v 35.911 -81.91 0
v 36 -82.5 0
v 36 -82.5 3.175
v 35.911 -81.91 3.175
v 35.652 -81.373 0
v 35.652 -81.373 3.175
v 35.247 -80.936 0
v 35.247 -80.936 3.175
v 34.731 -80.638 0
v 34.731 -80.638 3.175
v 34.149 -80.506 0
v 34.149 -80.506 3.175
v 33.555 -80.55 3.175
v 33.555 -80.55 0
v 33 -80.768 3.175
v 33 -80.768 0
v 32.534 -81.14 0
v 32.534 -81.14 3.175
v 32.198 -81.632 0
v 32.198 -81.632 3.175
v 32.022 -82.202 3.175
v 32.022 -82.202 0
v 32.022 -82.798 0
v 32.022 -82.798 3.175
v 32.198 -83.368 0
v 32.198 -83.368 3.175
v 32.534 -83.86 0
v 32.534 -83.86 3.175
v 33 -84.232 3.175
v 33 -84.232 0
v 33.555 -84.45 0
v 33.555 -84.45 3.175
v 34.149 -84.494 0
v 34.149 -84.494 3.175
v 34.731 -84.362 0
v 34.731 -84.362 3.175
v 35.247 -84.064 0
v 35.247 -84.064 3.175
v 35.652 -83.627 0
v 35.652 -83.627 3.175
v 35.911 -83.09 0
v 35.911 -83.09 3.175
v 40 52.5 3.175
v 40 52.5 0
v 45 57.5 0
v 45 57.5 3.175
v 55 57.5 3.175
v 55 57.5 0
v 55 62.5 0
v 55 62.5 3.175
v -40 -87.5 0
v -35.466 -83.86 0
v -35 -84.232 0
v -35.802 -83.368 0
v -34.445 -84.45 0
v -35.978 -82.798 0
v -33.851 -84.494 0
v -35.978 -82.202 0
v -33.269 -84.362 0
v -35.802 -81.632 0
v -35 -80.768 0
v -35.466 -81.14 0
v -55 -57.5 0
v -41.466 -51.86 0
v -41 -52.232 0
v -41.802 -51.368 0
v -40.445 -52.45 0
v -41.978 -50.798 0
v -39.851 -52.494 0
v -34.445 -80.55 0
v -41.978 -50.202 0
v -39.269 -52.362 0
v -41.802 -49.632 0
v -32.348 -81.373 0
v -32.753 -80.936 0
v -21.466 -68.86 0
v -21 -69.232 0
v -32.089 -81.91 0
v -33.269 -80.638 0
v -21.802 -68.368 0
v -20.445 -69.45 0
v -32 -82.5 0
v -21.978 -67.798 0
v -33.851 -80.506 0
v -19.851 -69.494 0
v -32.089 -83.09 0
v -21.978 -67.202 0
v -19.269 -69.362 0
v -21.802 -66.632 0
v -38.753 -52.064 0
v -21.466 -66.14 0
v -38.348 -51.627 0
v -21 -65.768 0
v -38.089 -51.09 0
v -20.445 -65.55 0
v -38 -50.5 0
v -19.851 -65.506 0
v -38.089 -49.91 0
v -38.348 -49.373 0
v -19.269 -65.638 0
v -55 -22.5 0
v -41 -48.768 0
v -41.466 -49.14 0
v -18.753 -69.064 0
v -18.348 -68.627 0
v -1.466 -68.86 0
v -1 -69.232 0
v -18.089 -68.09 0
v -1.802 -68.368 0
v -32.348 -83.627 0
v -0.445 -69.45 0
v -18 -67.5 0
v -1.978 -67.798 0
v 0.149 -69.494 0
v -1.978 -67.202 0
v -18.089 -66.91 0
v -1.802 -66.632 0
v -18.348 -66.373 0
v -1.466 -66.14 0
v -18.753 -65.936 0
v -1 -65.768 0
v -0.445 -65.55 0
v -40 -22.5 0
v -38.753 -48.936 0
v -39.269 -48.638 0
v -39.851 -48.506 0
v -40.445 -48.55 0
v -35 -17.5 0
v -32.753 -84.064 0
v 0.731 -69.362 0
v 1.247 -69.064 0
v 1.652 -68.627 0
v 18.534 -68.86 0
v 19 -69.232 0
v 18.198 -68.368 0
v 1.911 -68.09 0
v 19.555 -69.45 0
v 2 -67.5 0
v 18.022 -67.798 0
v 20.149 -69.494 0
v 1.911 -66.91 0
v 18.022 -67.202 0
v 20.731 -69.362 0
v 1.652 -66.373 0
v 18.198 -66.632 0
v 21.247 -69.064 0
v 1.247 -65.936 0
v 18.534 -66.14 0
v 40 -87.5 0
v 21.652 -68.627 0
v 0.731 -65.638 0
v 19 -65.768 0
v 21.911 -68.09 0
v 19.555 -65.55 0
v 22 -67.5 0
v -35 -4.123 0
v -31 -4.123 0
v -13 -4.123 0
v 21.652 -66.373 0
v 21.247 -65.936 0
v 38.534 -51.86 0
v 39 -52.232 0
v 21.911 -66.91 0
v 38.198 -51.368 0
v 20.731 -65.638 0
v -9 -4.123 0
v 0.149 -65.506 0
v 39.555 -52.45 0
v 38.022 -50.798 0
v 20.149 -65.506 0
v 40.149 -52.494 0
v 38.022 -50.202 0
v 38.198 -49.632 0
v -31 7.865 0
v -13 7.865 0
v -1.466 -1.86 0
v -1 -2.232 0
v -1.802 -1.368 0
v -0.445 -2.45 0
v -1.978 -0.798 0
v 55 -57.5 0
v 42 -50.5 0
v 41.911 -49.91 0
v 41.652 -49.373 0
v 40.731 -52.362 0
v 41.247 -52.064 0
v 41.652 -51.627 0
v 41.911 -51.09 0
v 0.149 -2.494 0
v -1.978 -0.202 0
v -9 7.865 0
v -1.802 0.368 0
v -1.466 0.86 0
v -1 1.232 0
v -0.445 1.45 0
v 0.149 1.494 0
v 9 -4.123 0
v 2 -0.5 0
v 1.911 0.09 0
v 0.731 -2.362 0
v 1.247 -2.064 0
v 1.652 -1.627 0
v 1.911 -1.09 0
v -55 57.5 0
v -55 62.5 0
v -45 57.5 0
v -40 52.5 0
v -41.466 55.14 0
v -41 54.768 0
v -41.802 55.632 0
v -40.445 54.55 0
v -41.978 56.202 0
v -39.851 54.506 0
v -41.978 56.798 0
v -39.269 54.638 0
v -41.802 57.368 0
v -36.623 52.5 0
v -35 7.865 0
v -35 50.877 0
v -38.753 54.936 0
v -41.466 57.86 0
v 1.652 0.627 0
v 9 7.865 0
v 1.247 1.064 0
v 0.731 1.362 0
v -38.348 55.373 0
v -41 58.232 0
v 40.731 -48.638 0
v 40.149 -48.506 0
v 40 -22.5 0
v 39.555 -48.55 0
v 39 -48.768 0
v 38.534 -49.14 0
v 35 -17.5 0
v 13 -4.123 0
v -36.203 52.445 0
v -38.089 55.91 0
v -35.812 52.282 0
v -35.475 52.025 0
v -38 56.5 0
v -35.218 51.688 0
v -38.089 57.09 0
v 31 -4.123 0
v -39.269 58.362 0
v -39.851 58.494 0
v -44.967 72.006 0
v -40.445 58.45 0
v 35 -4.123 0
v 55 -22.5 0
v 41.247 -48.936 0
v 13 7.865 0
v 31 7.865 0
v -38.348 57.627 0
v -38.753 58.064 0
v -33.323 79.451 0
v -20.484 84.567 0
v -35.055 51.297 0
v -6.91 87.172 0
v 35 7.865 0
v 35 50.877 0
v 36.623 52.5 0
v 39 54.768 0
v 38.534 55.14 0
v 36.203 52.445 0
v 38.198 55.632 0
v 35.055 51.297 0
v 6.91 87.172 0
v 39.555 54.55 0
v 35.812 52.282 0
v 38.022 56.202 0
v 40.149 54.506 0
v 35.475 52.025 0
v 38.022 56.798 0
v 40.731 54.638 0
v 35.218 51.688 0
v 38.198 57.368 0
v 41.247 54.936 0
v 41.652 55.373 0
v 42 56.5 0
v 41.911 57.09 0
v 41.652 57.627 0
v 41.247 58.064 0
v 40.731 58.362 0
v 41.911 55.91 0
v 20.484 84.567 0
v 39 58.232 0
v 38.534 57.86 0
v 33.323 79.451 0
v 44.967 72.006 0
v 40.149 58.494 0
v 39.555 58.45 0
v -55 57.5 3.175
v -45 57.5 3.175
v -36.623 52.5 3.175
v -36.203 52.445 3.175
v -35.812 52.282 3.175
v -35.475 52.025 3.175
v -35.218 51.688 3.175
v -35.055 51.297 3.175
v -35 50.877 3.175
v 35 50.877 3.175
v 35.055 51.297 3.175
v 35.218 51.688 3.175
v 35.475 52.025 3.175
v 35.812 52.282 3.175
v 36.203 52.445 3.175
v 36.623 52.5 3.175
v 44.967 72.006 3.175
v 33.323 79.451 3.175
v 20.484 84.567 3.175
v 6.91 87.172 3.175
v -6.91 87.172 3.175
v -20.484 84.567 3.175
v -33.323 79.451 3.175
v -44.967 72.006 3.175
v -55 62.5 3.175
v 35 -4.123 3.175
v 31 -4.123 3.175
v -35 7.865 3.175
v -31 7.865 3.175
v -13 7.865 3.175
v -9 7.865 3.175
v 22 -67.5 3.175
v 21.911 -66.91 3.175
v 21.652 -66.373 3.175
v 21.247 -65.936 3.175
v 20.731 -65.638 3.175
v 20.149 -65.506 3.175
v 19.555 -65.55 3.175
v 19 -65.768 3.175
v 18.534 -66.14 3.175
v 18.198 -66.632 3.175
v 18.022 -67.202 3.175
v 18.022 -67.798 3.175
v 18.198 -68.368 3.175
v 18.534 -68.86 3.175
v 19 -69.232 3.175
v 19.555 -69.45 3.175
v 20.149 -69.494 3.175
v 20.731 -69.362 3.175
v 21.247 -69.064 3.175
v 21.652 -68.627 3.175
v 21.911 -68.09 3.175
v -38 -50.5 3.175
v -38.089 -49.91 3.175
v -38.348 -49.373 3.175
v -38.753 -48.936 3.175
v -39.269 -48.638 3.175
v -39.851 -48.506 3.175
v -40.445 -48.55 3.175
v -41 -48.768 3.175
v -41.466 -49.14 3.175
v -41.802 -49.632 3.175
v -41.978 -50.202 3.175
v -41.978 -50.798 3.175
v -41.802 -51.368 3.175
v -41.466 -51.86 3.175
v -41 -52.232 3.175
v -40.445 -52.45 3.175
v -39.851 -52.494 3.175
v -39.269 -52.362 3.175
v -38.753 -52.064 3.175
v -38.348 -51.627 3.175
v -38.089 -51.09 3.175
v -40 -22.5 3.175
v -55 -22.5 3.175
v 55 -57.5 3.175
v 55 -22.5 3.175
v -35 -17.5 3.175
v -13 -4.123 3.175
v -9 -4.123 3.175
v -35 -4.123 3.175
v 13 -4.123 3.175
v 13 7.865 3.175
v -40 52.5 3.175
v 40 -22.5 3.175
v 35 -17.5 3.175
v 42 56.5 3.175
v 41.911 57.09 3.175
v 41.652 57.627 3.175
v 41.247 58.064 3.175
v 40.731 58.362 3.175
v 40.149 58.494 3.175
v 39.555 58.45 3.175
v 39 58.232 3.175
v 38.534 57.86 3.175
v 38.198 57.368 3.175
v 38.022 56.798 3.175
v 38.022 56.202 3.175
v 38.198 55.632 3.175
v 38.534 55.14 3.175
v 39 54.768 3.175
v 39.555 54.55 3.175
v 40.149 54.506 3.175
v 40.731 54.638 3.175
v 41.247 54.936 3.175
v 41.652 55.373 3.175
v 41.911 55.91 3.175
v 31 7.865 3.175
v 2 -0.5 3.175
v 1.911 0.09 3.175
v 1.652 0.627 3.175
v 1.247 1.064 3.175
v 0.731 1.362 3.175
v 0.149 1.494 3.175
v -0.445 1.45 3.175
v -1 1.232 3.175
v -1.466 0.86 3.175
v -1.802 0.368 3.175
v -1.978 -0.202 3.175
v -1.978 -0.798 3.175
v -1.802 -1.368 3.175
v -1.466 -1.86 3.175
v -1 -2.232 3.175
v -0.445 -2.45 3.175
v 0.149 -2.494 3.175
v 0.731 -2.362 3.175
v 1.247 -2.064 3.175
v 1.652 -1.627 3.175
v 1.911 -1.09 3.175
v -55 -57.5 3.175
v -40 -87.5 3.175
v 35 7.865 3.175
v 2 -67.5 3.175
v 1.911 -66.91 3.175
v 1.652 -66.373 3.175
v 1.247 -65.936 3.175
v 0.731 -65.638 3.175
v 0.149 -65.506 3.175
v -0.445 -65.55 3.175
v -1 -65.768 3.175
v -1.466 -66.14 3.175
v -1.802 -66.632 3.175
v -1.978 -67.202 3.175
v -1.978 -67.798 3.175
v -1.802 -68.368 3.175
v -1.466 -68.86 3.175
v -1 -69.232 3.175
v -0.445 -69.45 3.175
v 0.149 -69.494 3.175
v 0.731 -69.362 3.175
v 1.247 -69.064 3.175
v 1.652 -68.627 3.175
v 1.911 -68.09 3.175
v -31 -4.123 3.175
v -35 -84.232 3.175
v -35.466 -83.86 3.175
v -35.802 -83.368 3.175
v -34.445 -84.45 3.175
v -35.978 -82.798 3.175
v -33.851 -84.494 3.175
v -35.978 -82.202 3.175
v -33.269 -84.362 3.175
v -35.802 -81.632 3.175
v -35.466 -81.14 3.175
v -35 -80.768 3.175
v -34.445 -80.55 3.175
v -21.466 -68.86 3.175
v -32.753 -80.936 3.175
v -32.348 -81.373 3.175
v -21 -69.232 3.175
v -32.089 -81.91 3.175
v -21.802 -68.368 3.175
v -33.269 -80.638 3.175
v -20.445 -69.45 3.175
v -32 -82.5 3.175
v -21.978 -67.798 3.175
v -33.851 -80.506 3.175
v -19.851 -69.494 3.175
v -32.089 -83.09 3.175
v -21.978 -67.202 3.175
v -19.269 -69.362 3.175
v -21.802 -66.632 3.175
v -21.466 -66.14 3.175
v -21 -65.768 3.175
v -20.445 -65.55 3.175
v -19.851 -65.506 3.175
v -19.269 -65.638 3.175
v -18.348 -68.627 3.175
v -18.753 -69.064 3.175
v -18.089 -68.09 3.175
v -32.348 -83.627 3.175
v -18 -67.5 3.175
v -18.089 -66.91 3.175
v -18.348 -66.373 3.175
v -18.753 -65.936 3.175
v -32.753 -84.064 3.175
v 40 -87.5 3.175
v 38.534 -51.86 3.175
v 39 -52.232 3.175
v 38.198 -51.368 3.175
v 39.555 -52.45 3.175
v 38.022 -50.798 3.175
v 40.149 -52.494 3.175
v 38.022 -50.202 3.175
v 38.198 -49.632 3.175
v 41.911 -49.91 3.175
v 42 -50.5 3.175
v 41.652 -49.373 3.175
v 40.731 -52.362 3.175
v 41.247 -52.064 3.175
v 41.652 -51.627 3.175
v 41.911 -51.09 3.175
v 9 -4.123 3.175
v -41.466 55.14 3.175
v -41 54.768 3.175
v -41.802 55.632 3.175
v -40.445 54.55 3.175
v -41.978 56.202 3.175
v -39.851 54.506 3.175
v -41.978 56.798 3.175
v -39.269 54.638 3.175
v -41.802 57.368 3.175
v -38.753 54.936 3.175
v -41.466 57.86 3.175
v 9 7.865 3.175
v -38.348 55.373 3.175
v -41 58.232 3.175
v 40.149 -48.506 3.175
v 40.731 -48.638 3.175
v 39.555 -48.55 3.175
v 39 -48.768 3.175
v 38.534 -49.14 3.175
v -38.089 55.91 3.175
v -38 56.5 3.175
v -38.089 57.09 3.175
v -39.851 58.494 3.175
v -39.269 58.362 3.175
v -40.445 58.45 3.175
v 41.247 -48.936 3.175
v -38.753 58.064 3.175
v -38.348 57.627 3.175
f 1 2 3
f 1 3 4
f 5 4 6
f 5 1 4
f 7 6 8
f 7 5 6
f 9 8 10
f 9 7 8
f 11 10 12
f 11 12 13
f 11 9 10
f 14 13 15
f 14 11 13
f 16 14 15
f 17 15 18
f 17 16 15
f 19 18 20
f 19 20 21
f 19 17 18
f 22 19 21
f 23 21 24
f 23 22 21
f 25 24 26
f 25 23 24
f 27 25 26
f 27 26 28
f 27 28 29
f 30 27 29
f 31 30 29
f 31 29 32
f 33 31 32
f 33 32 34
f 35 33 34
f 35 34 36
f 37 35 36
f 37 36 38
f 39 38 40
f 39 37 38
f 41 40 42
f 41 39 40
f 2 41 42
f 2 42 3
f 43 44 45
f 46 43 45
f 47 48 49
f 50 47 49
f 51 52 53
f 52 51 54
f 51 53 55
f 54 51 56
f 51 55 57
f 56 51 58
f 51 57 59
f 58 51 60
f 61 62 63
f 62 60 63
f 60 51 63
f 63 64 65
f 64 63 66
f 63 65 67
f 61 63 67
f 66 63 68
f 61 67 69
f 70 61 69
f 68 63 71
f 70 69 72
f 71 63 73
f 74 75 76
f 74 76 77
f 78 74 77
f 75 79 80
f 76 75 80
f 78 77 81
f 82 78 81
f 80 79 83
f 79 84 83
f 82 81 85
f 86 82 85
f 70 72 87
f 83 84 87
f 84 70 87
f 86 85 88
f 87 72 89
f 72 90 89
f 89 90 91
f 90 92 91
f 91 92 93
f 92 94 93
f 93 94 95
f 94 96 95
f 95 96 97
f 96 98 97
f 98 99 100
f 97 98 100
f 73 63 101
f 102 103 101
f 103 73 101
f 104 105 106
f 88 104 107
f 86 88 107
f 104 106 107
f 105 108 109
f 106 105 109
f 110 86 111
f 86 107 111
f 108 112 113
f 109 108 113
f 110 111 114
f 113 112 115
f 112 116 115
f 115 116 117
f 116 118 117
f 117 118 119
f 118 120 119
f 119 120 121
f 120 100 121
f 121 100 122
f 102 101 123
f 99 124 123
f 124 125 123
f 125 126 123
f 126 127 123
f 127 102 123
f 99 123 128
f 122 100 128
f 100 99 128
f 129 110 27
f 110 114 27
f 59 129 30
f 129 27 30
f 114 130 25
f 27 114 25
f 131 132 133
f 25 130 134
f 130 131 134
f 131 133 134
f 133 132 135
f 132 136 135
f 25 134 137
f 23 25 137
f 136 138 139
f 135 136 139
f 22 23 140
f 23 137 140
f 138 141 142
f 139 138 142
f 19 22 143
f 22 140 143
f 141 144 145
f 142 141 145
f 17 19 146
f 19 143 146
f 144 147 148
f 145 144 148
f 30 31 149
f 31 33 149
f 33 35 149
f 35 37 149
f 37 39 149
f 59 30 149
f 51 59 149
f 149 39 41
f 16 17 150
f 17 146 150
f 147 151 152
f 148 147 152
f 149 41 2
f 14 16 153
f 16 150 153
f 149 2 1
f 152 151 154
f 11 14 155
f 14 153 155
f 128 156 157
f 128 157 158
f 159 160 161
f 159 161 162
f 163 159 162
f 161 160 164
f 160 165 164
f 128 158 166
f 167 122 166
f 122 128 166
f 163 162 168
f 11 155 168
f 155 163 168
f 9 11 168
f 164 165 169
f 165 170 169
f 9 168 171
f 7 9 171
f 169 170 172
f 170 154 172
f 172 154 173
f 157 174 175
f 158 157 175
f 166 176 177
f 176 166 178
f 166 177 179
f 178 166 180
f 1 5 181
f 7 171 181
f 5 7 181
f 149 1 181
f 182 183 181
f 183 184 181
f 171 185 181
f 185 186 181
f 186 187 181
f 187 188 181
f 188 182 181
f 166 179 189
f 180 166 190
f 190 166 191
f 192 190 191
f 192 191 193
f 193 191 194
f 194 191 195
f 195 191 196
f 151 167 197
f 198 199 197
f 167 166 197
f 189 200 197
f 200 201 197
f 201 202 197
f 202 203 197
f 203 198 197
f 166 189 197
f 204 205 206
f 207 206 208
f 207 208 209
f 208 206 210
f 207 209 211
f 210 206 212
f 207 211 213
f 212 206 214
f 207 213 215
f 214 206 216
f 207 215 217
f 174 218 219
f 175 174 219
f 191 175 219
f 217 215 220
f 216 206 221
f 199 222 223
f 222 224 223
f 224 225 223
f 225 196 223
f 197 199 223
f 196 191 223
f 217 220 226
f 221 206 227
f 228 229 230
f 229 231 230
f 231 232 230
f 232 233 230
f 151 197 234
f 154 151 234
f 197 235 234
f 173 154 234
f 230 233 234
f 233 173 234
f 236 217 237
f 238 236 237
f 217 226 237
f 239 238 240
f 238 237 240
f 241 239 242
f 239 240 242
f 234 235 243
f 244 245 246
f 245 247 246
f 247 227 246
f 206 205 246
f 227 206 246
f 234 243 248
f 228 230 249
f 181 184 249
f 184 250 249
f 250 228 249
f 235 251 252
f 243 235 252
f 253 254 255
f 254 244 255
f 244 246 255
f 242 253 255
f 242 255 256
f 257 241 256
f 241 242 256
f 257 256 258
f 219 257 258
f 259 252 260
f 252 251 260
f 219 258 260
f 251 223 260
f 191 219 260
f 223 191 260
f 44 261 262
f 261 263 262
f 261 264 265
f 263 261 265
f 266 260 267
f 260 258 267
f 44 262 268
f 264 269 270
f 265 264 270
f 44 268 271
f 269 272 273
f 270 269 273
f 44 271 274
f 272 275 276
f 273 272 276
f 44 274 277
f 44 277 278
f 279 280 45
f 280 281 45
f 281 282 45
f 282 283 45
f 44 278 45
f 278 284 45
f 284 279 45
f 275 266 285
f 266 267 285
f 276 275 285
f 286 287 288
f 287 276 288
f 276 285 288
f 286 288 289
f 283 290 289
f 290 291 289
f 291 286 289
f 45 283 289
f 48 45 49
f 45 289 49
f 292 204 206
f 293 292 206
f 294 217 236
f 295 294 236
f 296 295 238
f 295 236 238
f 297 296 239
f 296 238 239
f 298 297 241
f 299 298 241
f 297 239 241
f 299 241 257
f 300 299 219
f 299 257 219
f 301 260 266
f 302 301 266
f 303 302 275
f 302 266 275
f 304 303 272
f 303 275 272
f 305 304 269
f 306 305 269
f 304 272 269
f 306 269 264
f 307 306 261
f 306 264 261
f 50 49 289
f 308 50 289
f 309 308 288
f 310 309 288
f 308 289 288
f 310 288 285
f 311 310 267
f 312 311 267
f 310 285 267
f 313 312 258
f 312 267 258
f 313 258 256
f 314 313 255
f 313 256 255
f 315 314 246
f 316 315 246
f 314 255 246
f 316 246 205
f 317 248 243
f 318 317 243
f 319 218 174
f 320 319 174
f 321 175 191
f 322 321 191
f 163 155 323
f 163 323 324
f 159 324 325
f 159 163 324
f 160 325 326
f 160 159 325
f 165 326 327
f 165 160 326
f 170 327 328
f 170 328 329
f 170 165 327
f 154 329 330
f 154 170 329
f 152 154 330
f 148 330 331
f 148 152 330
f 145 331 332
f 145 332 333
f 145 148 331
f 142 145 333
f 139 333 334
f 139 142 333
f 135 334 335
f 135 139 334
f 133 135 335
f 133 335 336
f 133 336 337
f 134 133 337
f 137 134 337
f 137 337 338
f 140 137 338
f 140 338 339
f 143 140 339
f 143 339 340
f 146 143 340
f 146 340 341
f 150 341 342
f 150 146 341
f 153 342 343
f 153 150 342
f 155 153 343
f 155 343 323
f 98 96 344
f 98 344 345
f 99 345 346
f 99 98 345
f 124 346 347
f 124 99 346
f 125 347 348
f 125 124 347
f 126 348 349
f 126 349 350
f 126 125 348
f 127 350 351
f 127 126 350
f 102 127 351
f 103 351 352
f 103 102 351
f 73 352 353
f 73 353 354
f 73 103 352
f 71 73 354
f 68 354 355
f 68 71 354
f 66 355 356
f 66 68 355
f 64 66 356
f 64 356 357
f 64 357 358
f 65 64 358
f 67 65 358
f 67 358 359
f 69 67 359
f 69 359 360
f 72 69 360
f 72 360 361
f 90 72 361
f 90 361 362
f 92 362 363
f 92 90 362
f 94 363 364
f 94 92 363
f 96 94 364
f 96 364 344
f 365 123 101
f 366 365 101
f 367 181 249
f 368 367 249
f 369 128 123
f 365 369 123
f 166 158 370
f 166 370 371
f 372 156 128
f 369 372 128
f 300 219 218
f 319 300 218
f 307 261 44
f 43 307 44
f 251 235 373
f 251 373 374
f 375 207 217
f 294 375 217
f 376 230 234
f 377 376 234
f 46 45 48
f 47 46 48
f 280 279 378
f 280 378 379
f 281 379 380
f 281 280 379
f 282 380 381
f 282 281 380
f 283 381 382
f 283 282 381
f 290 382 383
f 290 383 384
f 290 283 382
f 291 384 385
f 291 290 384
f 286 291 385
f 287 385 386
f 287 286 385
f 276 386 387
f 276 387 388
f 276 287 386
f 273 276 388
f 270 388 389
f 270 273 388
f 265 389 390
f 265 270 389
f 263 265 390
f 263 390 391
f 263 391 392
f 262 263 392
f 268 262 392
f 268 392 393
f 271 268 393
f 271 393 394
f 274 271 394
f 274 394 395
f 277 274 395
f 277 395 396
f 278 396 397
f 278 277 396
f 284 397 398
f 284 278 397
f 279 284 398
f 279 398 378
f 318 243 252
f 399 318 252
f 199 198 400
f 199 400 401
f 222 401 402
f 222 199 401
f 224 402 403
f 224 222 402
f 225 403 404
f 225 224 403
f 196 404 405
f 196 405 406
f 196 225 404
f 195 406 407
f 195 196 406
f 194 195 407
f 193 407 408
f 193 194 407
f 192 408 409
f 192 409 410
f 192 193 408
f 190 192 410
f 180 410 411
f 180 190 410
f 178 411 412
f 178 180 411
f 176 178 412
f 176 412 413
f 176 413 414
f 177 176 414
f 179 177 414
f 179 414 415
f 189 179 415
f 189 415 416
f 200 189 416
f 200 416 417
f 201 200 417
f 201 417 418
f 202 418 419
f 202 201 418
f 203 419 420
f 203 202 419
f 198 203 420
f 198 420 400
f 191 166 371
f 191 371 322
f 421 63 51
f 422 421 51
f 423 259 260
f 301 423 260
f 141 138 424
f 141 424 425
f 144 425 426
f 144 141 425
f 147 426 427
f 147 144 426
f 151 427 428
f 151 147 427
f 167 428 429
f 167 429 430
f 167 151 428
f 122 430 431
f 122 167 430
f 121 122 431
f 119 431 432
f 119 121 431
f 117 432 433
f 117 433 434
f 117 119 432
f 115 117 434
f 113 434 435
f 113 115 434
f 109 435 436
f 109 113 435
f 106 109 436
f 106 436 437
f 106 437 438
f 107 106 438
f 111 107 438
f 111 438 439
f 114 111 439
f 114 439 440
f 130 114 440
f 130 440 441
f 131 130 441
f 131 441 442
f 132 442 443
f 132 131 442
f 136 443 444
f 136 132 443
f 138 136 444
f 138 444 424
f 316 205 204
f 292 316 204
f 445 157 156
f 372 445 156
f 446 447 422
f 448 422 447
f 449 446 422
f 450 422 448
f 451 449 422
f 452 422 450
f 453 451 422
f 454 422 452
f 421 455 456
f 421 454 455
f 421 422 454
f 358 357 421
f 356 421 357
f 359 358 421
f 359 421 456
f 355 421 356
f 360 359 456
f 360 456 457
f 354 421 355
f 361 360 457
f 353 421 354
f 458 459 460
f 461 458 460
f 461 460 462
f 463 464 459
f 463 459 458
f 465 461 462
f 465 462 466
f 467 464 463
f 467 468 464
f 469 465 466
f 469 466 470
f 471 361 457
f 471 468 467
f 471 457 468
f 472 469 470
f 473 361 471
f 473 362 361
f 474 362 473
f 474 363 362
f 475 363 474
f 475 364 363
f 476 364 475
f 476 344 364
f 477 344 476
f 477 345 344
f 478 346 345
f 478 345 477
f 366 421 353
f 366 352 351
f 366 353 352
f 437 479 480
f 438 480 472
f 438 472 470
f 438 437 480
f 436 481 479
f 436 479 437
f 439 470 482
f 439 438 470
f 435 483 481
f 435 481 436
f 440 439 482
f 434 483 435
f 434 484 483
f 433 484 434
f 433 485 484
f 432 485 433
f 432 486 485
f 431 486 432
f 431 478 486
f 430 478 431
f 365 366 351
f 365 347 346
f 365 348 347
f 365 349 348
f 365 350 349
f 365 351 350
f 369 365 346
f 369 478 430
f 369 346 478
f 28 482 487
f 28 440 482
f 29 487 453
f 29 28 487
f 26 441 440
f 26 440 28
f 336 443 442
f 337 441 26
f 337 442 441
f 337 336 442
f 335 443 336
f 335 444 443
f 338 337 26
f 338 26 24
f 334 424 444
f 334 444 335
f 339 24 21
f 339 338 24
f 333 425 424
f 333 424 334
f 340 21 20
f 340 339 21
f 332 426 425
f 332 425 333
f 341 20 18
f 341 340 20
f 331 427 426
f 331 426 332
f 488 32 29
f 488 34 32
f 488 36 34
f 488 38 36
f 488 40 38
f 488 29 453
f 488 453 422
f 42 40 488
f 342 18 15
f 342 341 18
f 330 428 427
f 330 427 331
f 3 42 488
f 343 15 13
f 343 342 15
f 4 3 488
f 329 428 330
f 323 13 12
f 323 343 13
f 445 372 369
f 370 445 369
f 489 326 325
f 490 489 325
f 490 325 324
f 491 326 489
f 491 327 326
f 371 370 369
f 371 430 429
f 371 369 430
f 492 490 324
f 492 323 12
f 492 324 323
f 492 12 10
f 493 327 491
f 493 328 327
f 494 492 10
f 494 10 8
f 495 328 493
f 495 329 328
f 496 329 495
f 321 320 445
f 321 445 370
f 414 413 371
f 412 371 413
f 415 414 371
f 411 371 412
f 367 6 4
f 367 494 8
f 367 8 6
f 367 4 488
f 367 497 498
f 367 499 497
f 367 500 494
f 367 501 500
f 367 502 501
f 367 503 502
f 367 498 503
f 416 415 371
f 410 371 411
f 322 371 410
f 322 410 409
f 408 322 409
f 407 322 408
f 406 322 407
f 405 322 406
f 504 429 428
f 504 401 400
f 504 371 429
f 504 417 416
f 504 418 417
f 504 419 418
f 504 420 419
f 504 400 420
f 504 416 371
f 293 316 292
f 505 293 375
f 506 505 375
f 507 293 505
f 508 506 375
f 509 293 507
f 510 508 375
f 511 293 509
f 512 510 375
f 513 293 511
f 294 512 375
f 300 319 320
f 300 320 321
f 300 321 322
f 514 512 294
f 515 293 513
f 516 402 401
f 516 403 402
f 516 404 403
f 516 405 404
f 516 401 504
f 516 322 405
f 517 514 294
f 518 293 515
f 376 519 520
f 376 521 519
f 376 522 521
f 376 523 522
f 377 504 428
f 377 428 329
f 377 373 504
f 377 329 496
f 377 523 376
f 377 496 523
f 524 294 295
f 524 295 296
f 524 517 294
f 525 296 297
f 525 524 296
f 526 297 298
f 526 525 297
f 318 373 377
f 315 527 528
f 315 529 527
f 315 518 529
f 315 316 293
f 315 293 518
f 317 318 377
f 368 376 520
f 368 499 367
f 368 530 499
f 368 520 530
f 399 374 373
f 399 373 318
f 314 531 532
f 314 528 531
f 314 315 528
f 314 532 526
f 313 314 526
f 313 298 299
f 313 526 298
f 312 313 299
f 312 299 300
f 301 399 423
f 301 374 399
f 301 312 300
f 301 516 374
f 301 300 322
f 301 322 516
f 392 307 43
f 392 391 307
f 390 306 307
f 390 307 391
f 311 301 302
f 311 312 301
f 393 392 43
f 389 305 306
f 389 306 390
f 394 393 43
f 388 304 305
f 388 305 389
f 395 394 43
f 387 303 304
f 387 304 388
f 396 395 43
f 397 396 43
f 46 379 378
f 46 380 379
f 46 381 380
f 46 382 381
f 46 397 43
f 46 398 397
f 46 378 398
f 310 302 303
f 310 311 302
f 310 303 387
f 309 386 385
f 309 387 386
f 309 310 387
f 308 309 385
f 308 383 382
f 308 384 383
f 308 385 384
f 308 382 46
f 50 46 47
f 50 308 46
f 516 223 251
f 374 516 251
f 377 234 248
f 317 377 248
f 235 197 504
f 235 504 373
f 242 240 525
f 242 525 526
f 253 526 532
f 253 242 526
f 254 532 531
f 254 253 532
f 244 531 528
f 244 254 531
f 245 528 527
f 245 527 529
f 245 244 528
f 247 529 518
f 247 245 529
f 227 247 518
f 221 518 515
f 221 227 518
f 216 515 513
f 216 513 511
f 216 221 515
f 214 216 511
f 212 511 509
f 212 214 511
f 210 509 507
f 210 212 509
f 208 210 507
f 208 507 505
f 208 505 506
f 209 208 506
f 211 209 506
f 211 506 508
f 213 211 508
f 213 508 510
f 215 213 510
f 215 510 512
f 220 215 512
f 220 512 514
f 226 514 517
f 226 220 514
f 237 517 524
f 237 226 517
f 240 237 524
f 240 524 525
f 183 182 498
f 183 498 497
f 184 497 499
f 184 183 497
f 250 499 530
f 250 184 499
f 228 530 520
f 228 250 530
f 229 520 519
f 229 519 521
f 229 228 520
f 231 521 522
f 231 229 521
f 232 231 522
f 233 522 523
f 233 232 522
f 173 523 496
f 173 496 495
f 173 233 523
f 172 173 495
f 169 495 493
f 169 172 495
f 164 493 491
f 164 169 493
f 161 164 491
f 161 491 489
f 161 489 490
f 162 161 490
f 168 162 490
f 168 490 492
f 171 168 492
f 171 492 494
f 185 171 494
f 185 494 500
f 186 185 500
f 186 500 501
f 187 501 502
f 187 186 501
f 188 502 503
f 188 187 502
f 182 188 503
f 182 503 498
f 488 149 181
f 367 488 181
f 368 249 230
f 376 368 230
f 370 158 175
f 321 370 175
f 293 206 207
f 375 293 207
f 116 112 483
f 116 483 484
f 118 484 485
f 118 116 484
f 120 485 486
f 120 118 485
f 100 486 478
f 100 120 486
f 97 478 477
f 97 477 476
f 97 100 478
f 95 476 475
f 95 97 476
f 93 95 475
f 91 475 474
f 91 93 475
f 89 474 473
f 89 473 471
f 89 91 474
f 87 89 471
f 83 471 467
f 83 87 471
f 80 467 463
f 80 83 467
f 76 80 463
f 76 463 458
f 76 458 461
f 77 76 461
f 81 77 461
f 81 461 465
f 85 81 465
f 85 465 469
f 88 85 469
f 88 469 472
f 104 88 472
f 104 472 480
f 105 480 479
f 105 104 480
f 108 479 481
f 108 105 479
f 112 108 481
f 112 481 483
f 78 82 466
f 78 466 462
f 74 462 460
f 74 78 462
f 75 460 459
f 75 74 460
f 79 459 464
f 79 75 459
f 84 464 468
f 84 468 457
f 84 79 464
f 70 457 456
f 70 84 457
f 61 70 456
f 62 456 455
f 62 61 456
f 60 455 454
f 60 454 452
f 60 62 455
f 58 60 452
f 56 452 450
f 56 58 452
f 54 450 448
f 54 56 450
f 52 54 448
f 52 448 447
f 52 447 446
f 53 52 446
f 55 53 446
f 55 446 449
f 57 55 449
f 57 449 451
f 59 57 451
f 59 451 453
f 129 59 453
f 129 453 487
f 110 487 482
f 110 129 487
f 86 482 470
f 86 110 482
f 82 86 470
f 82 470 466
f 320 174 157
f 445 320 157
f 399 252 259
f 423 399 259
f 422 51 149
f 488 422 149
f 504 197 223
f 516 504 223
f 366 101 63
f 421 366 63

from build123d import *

# Parameters (mm, degrees)
F0_R     = 2
F0_W     = 4
F0_H     = 11.9888
F1_DEPTH = 3.175


with BuildPart() as f1:
    # F0 (on Top) → F1 (new body)
    with BuildSketch(Plane.XY):
        with BuildLine():
            Line((-55, -57.5), (-40, -87.5))
            Line((-40, -87.5), (40, -87.5))
            Line((40, -87.5), (55, -57.5))
            Line((55, -57.5), (55, -22.5))
            Line((55, -22.5), (40, -22.5))
            Line((40, -22.5), (35, -17.5))
            Line((35, -17.5), (35, -4.123451))
            Line((35, -4.123451), (31, -4.123451))
            Line((31, -4.123451), (31, 7.865349))
            Line((31, 7.865349), (35, 7.865349))
            Line((35, 7.865349), (35, 50.876549))
            ThreePointArc((35, 50.876549), (35.475498, 52.024502), (36.623451, 52.5))
            Line((36.623451, 52.5), (40, 52.5))
            Line((40, 52.5), (45, 57.5))
            Line((45, 57.5), (55, 57.5))
            Line((55, 57.5), (55, 62.5))
            ThreePointArc((55, 62.5), (0, 87.5), (-55, 62.5))
            Line((-55, 62.5), (-55, 57.5))
            Line((-55, 57.5), (-45, 57.5))
            Line((-45, 57.5), (-40, 52.5))
            Line((-40, 52.5), (-36.623451, 52.5))
            ThreePointArc((-36.623451, 52.5), (-35.475498, 52.024502), (-35, 50.876549))
            Line((-35, 50.876549), (-35, 7.865349))
            Line((-35, 7.865349), (-31, 7.865349))
            Line((-31, 7.865349), (-31, -4.123451))
            Line((-31, -4.123451), (-35, -4.123451))
            Line((-35, -4.123451), (-35, -17.5))
            Line((-35, -17.5), (-40, -22.5))
            Line((-40, -22.5), (-55, -22.5))
            Line((-55, -22.5), (-55, -57.5))
        make_face()
        with Locations((-34, -82.5)):
            Circle(F0_R, mode=Mode.SUBTRACT)
        with Locations((-40, -50.5)):
            Circle(F0_R, mode=Mode.SUBTRACT)
        with Locations((-20, -67.5)):
            Circle(F0_R, mode=Mode.SUBTRACT)
        with Locations((0, -67.5)):
            Circle(F0_R, mode=Mode.SUBTRACT)
        with Locations((20, -67.5)):
            Circle(F0_R, mode=Mode.SUBTRACT)
        with Locations((34, -82.5)):
            Circle(F0_R, mode=Mode.SUBTRACT)
        with Locations((40, -50.5)):
            Circle(F0_R, mode=Mode.SUBTRACT)
        with Locations((0, -0.5)):
            Circle(F0_R, mode=Mode.SUBTRACT)
        with Locations((-11, 1.870949)):
            Rectangle(F0_W, F0_H, mode=Mode.SUBTRACT)
        with Locations((-40, 56.5)):
            Circle(F0_R, mode=Mode.SUBTRACT)
        with Locations((11, 1.870949)):
            Rectangle(F0_W, F0_H, mode=Mode.SUBTRACT)
        with Locations((40, 56.5)):
            Circle(F0_R, mode=Mode.SUBTRACT)
    extrude(amount=F1_DEPTH)


solid = f1.part
